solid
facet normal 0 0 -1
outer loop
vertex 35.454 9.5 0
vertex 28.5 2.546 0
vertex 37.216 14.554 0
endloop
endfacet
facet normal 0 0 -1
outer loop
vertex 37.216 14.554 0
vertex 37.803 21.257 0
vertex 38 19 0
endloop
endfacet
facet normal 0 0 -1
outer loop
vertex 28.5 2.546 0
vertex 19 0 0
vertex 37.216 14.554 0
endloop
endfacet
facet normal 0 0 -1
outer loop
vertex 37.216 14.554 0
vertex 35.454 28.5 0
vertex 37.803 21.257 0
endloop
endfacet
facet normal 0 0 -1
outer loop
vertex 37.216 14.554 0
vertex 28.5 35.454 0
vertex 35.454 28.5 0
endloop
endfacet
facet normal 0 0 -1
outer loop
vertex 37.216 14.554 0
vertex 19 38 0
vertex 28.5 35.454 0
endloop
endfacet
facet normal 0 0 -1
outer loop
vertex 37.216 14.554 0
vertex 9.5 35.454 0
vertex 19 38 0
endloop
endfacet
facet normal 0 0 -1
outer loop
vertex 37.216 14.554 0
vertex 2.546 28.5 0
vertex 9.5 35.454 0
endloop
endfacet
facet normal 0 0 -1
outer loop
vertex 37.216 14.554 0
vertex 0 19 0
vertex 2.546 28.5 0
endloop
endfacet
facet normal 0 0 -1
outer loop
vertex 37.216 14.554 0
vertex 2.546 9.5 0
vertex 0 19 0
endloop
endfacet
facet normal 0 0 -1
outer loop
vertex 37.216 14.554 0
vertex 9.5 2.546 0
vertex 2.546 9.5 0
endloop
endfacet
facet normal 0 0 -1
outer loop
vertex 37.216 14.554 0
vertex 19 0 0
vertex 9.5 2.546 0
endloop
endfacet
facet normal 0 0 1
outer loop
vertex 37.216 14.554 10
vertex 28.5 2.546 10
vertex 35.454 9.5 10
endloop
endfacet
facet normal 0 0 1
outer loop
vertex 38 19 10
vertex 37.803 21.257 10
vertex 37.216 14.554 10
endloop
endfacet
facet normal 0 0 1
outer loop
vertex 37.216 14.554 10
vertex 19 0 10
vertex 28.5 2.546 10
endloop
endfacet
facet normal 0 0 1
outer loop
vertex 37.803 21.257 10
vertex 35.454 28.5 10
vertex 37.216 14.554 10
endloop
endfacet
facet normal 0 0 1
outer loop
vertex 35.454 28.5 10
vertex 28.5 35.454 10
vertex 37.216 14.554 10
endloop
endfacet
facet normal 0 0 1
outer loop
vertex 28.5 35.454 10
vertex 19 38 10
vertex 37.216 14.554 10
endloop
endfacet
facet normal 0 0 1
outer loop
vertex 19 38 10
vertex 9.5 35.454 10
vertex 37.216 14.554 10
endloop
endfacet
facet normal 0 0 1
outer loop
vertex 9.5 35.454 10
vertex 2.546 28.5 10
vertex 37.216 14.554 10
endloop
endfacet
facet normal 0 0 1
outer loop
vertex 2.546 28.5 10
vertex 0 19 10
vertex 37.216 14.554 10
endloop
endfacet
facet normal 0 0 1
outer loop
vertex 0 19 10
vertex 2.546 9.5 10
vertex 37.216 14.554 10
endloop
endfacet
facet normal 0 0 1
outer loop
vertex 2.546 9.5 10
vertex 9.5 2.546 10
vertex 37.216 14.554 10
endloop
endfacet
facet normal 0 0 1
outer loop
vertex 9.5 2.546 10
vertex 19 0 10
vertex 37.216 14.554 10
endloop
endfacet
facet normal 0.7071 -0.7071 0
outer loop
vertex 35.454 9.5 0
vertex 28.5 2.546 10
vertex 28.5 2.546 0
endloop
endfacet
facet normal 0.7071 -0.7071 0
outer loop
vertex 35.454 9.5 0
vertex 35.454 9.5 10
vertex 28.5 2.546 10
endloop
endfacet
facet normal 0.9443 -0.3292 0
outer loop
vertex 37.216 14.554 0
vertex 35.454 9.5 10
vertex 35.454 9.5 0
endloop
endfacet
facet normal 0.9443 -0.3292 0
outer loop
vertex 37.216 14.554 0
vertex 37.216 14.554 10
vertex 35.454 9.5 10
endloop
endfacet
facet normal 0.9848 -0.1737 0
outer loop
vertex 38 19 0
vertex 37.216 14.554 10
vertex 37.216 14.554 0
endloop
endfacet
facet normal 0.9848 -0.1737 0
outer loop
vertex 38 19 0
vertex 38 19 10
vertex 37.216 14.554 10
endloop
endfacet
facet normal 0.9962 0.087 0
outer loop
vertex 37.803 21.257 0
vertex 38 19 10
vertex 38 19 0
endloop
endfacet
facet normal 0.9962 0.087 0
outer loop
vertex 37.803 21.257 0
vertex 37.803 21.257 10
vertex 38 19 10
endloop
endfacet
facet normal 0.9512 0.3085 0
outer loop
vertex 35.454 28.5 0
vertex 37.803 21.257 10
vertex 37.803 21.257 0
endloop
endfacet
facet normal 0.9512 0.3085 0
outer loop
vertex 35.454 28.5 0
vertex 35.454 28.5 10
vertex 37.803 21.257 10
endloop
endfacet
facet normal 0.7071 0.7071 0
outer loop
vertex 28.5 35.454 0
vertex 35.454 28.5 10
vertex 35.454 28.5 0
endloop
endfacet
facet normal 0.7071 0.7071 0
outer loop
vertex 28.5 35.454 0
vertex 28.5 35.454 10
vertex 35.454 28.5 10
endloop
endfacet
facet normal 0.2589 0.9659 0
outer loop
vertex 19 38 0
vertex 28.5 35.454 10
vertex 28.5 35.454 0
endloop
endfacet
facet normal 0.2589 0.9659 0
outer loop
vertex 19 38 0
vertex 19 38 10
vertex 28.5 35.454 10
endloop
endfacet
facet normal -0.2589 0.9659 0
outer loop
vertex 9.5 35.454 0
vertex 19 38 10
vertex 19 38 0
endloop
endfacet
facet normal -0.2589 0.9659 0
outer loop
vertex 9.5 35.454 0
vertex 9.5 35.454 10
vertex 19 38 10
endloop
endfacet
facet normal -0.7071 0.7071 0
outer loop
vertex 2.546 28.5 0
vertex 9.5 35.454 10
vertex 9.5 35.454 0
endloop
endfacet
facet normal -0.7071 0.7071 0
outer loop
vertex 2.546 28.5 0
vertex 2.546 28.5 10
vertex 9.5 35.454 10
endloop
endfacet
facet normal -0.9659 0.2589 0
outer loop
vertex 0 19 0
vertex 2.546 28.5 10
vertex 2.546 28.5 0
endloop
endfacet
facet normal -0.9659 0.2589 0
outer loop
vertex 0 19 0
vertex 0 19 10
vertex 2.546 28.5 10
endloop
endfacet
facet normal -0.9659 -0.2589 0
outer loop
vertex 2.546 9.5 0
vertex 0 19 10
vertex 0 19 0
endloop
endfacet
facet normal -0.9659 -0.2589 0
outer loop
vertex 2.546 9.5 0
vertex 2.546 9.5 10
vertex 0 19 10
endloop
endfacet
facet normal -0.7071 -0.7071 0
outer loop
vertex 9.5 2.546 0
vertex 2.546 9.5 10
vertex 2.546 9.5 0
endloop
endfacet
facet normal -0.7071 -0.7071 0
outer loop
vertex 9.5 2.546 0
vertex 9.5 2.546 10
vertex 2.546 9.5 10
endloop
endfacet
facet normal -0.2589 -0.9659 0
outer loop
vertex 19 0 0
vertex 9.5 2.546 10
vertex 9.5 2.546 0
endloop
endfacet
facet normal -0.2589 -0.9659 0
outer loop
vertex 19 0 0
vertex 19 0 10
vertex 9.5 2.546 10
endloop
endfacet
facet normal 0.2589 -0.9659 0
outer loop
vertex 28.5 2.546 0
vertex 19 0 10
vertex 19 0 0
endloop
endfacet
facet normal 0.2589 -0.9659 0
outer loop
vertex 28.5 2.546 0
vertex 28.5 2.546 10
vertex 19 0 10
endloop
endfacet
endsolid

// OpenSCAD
$fn = 32;

// ----------------------------------------------------------------------
// Eccentric disc: egg, 10 mm thick
// ----------------------------------------------------------------------

// --- parameters (mm) ---
profile_height = 10;      // extrusion height
profile_points = 14;      // points of the closed outline

profile = [[0, 19], [2.546, 9.5], [9.5, 2.546], [19, 0], [28.5, 2.546], [35.454, 9.5], [37.216, 14.554], [38, 19], [37.803, 21.257], [35.454, 28.5], [28.5, 35.454], [19, 38], [9.5, 35.454], [2.546, 28.5]];  // single closed polygon, 14 points, counter clockwise

// --- the one profile operation ---
linear_extrude(height = profile_height) polygon(points = profile);
